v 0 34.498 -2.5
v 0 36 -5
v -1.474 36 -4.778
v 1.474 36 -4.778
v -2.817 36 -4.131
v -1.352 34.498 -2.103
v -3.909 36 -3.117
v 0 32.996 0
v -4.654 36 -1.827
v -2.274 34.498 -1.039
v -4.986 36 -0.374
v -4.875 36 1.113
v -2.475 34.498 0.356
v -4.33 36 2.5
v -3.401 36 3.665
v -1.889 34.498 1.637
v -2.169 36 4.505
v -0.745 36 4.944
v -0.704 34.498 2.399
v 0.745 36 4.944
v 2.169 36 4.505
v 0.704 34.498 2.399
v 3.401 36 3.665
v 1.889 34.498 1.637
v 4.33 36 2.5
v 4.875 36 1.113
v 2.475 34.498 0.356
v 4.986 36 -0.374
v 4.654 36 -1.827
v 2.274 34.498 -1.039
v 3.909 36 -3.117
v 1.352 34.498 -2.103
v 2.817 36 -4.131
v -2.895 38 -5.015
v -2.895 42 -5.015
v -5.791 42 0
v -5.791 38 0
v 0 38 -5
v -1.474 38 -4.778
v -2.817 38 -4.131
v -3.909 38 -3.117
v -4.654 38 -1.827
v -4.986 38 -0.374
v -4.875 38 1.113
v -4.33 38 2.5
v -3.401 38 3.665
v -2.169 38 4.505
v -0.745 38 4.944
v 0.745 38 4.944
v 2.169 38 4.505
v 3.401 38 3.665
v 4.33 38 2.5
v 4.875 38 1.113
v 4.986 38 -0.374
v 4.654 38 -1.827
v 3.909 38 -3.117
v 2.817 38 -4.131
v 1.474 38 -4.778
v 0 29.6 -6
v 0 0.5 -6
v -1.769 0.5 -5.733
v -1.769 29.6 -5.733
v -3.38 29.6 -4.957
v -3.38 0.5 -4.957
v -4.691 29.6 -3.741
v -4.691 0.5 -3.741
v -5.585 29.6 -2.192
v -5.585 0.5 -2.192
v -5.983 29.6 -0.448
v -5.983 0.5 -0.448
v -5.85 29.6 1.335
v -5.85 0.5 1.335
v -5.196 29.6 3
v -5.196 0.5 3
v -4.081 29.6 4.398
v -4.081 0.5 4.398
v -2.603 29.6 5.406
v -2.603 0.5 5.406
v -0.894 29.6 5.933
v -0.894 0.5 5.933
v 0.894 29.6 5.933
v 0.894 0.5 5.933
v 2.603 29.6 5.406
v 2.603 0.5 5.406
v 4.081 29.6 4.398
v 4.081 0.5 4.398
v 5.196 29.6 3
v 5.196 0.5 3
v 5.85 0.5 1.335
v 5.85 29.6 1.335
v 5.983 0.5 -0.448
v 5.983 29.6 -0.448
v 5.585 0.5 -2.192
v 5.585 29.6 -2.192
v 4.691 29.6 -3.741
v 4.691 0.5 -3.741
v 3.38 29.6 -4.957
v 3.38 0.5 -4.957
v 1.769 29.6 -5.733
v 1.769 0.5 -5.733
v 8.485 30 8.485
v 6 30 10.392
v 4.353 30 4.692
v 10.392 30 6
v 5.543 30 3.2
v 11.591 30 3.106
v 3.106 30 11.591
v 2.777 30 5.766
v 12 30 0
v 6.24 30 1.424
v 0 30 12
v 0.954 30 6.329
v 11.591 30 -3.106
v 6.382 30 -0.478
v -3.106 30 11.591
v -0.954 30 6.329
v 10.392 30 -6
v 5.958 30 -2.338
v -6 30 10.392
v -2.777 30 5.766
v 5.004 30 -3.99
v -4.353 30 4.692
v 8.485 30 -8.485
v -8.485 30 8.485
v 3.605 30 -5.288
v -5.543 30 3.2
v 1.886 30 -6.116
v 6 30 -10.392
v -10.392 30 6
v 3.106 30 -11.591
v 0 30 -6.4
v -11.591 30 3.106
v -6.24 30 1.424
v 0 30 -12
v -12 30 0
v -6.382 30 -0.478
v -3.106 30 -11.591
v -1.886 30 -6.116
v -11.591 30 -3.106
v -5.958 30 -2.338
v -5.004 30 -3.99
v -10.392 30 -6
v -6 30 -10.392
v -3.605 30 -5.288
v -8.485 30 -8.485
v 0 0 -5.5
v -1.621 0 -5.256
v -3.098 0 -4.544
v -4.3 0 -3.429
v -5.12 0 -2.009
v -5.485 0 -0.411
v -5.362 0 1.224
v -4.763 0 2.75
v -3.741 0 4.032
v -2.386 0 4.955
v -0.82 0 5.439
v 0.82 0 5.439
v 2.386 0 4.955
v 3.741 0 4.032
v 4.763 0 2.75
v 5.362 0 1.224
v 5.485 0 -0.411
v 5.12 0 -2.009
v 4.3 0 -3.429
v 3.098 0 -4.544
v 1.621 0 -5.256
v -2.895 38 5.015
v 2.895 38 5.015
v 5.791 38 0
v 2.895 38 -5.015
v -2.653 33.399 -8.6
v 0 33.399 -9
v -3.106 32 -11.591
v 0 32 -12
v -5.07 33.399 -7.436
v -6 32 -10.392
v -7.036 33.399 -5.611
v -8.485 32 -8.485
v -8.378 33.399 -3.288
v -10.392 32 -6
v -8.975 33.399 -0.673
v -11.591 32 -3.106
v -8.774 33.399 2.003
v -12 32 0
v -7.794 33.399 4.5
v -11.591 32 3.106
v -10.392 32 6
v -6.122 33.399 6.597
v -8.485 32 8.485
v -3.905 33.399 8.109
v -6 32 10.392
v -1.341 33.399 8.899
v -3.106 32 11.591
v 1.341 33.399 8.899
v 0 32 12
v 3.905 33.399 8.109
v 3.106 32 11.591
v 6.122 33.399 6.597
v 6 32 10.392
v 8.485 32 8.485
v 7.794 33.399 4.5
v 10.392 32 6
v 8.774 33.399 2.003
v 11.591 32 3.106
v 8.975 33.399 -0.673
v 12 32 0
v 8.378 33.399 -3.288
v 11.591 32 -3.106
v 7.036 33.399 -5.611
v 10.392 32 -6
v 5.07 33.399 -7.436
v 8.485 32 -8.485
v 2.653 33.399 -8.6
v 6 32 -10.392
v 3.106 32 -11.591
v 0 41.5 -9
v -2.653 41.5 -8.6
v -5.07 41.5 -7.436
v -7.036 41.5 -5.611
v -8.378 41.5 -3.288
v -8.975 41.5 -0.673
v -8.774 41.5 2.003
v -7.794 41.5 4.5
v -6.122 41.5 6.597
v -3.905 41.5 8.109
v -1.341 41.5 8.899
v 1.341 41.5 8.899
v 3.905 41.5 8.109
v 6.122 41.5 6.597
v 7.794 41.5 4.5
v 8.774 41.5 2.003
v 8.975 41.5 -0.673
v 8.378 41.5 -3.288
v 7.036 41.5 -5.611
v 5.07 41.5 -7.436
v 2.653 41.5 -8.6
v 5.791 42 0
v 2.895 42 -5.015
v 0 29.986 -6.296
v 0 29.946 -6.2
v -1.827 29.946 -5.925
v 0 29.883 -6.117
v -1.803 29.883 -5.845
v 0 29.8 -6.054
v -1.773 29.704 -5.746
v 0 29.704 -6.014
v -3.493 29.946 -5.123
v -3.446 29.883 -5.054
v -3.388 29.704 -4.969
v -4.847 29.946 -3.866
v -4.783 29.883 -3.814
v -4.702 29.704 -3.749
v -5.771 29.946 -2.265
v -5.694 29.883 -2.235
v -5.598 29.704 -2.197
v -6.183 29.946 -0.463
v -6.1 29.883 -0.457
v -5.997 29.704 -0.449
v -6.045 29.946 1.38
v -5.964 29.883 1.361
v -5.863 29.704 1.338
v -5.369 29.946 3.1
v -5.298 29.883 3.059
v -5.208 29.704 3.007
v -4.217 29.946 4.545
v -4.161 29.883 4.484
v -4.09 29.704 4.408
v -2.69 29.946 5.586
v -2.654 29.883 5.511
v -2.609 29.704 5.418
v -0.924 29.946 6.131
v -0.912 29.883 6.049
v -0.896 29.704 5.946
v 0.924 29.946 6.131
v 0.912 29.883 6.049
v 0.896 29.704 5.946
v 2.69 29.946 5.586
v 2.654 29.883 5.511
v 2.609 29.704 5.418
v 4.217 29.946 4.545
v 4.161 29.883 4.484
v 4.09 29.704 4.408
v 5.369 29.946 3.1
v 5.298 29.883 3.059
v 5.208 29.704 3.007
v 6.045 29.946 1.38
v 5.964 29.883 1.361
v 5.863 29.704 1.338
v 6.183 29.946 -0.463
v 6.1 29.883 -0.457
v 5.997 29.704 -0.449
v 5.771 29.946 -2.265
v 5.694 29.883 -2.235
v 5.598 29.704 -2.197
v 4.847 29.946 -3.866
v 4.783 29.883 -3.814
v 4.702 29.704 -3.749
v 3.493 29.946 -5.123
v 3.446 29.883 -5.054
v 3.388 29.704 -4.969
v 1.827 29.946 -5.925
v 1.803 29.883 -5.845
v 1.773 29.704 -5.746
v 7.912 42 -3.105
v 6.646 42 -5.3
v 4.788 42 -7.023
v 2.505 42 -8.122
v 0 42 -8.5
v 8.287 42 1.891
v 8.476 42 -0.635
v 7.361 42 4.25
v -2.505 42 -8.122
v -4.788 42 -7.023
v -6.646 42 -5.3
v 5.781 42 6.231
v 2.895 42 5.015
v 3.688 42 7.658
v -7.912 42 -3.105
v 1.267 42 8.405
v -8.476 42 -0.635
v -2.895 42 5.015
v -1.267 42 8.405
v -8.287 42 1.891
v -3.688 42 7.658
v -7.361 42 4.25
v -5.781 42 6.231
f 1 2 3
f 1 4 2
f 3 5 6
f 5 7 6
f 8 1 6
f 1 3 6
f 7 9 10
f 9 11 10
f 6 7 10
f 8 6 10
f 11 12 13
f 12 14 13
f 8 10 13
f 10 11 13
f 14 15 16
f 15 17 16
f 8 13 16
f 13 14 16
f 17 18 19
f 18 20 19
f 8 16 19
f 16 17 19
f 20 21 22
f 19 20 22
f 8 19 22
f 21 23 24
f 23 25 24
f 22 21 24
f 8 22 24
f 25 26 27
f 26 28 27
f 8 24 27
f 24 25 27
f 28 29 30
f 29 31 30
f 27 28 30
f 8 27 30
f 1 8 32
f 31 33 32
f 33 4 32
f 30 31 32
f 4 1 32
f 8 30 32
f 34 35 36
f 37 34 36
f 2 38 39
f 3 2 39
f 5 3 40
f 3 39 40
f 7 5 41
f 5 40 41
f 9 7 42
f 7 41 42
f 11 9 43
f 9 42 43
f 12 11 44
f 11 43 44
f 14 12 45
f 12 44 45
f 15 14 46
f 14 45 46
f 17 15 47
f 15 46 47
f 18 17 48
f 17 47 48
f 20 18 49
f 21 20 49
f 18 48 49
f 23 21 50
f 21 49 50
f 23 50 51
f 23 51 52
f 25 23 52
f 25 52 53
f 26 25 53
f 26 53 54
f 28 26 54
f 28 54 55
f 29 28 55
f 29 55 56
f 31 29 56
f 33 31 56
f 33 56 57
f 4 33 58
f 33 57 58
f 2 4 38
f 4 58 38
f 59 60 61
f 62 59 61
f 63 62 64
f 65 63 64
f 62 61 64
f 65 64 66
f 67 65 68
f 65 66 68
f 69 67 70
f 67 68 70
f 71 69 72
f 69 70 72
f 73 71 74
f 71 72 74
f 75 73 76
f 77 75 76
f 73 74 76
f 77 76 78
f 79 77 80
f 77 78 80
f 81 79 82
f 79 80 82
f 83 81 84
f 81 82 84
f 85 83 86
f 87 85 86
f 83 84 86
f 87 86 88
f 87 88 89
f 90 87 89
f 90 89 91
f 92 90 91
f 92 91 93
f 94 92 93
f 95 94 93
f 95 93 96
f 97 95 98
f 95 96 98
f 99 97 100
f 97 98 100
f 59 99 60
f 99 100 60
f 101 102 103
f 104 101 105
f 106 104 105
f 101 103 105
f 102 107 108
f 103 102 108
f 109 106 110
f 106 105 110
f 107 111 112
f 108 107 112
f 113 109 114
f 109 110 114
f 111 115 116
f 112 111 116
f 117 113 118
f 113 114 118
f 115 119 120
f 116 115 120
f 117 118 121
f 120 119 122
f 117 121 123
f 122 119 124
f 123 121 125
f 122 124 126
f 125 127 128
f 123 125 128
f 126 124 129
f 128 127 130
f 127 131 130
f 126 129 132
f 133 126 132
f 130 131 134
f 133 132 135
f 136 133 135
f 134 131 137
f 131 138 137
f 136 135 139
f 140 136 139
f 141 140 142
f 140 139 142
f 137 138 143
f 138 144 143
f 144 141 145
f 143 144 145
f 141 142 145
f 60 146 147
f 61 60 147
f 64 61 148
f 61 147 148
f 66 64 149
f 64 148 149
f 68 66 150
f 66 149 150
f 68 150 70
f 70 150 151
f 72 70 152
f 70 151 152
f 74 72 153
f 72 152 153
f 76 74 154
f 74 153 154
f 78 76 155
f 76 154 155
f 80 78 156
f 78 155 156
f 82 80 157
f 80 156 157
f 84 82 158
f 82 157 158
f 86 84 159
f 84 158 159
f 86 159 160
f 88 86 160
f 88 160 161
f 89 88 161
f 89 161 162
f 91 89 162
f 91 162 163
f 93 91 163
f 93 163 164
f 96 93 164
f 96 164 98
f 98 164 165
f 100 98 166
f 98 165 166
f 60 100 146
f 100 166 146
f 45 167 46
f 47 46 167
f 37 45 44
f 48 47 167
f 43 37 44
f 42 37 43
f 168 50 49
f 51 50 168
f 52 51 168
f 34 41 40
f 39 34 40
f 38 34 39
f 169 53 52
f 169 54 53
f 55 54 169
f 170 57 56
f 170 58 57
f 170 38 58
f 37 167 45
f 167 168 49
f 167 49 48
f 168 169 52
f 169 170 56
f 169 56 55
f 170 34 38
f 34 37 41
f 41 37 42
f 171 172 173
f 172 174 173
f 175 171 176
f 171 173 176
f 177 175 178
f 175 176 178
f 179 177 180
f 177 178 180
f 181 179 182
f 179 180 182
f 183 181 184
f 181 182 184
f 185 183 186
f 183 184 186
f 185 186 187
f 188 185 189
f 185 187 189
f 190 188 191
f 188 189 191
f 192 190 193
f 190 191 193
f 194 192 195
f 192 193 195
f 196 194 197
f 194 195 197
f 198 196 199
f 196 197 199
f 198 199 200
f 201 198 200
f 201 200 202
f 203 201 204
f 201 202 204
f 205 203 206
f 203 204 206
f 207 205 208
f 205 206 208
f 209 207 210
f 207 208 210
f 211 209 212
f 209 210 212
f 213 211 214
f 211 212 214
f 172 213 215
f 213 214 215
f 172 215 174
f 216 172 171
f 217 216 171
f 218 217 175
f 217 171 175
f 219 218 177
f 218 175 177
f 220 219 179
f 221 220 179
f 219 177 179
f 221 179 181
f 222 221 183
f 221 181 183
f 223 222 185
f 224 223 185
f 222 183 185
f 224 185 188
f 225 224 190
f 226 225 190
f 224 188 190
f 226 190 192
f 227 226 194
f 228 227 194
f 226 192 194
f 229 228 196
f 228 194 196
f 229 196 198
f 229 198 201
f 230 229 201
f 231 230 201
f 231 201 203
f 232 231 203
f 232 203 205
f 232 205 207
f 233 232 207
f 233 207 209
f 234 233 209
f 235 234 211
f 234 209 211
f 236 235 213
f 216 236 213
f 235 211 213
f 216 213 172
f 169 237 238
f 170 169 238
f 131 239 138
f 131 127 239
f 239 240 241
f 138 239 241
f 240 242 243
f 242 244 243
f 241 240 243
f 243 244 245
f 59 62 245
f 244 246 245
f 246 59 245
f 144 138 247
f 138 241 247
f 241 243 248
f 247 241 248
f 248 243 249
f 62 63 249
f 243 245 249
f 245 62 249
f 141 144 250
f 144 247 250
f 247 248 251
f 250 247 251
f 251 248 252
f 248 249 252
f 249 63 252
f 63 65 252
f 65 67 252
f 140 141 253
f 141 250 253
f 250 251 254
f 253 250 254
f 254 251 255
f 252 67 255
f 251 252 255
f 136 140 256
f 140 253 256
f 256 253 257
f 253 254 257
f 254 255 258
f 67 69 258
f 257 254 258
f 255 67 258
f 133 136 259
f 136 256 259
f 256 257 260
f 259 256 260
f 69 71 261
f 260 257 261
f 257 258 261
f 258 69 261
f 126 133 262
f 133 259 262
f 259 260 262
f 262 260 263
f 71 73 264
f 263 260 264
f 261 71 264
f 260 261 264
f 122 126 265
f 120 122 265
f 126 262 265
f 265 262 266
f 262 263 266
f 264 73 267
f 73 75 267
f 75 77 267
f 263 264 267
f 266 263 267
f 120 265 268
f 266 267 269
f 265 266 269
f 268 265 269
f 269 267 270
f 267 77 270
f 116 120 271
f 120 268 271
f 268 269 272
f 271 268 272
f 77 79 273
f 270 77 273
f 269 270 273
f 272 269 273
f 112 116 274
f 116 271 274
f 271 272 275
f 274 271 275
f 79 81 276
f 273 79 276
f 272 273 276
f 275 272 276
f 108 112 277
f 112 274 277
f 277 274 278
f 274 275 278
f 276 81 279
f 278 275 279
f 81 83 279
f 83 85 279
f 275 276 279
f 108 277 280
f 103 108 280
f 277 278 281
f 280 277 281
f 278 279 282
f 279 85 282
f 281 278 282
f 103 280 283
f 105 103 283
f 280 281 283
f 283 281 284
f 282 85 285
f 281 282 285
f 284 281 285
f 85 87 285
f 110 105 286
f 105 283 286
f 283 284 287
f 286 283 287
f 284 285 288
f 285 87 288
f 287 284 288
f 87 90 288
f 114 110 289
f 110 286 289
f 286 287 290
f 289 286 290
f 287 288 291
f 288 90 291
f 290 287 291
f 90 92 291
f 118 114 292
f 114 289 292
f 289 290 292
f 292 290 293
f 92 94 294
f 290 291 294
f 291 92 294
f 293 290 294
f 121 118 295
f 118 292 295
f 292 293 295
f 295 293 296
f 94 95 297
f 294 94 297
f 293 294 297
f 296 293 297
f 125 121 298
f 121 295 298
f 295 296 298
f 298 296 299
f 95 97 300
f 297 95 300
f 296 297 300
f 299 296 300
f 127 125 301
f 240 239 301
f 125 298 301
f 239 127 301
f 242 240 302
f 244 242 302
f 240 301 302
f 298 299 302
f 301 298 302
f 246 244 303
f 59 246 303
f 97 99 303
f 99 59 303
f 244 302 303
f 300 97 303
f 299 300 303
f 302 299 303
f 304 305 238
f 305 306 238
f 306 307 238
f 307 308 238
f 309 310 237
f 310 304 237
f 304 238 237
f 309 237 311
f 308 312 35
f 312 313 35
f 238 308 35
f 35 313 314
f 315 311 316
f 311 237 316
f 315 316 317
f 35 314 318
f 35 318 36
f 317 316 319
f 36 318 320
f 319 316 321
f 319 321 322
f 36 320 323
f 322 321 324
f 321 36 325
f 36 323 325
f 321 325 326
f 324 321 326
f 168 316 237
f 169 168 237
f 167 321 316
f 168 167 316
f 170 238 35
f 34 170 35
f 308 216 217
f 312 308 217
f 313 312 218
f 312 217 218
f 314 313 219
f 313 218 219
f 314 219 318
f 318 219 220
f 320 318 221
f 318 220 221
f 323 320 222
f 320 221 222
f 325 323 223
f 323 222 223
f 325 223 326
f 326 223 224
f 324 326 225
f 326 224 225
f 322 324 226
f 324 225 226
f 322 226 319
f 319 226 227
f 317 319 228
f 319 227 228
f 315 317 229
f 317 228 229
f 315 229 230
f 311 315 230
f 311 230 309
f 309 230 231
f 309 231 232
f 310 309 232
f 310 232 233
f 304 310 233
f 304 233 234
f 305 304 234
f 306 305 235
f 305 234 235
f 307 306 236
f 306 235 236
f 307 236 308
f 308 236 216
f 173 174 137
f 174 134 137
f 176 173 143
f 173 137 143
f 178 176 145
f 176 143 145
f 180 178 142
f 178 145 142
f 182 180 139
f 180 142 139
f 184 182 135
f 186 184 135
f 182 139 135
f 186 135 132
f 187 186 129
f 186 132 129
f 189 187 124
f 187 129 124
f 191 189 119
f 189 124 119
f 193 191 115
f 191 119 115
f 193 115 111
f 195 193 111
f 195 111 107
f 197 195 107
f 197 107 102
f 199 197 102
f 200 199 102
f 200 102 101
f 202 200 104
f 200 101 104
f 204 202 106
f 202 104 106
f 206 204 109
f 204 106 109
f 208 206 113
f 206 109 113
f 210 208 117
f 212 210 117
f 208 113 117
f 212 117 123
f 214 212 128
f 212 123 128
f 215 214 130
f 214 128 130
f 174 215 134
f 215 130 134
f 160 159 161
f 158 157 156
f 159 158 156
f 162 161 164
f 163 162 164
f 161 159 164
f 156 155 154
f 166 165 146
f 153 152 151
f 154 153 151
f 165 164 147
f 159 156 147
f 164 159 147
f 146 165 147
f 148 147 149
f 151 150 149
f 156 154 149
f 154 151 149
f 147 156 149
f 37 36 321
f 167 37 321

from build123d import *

# Parameters (mm, degrees)
HEX_KEY_1_DEPTH     = 4
CHAMFER_HEAD_SIZE   = 0.5
CHAMFER_THREAD_SIZE = 0.5


with BuildPart() as part:
    # Sketch1 → Main Body (revolve)
    with BuildSketch(Plane.XY, mode=Mode.PRIVATE) as main_body_sk:
        with BuildLine():
            Line((5, 42), (9, 42))
            Line((9, 42), (9, 33.398922974))
            Line((9, 33.398922974), (12, 32))
            Line((12, 32), (12, 30))
            Line((12, 30), (6.4, 30))
            ThreePointArc((6.4, 30), (6.117157288, 29.882842712), (6, 29.6))
            Line((6, 29.6), (6, 0))
            Line((6, 0), (0, 0))
            Line((0, 0), (0, 32.995696905))
            Line((0, 32.995696905), (5, 36))
            Line((5, 36), (5, 42))
        make_face()
    revolve(main_body_sk.sketch.rotate(Axis((0, 0, 0), (0, 1, 0)), 90), axis=Axis((0, 0, 0), (0, 1, 0)))  # turned: the seam where the file's is

    # Sketch2 → Hex Key 1 (cut)
    with BuildSketch(Plane(origin=(0, 42, 0), x_dir=(1, 0, 0), z_dir=(0, 1, 0))):
        Polygon((-5.7908232, 0), (-2.8954116, -5.015), (2.8954116, -5.015), (5.7908232, 0), (2.8954116, 5.015), (-2.8954116, 5.015), align=None)
    extrude(amount=-HEX_KEY_1_DEPTH, mode=Mode.SUBTRACT)

    # Chamfer-Head
    chamfer_head_edges = [part.edges().sort_by_distance(p)[0] for p in [
        (0, 42, 9),
    ]]
    chamfer(chamfer_head_edges, length=CHAMFER_HEAD_SIZE)

    # Chamfer-Thread
    chamfer_thread_edges = [part.edges().sort_by_distance(p)[0] for p in [
        (0, 0, 6),
    ]]
    chamfer(chamfer_thread_edges, length=CHAMFER_THREAD_SIZE)


solid = part.part
